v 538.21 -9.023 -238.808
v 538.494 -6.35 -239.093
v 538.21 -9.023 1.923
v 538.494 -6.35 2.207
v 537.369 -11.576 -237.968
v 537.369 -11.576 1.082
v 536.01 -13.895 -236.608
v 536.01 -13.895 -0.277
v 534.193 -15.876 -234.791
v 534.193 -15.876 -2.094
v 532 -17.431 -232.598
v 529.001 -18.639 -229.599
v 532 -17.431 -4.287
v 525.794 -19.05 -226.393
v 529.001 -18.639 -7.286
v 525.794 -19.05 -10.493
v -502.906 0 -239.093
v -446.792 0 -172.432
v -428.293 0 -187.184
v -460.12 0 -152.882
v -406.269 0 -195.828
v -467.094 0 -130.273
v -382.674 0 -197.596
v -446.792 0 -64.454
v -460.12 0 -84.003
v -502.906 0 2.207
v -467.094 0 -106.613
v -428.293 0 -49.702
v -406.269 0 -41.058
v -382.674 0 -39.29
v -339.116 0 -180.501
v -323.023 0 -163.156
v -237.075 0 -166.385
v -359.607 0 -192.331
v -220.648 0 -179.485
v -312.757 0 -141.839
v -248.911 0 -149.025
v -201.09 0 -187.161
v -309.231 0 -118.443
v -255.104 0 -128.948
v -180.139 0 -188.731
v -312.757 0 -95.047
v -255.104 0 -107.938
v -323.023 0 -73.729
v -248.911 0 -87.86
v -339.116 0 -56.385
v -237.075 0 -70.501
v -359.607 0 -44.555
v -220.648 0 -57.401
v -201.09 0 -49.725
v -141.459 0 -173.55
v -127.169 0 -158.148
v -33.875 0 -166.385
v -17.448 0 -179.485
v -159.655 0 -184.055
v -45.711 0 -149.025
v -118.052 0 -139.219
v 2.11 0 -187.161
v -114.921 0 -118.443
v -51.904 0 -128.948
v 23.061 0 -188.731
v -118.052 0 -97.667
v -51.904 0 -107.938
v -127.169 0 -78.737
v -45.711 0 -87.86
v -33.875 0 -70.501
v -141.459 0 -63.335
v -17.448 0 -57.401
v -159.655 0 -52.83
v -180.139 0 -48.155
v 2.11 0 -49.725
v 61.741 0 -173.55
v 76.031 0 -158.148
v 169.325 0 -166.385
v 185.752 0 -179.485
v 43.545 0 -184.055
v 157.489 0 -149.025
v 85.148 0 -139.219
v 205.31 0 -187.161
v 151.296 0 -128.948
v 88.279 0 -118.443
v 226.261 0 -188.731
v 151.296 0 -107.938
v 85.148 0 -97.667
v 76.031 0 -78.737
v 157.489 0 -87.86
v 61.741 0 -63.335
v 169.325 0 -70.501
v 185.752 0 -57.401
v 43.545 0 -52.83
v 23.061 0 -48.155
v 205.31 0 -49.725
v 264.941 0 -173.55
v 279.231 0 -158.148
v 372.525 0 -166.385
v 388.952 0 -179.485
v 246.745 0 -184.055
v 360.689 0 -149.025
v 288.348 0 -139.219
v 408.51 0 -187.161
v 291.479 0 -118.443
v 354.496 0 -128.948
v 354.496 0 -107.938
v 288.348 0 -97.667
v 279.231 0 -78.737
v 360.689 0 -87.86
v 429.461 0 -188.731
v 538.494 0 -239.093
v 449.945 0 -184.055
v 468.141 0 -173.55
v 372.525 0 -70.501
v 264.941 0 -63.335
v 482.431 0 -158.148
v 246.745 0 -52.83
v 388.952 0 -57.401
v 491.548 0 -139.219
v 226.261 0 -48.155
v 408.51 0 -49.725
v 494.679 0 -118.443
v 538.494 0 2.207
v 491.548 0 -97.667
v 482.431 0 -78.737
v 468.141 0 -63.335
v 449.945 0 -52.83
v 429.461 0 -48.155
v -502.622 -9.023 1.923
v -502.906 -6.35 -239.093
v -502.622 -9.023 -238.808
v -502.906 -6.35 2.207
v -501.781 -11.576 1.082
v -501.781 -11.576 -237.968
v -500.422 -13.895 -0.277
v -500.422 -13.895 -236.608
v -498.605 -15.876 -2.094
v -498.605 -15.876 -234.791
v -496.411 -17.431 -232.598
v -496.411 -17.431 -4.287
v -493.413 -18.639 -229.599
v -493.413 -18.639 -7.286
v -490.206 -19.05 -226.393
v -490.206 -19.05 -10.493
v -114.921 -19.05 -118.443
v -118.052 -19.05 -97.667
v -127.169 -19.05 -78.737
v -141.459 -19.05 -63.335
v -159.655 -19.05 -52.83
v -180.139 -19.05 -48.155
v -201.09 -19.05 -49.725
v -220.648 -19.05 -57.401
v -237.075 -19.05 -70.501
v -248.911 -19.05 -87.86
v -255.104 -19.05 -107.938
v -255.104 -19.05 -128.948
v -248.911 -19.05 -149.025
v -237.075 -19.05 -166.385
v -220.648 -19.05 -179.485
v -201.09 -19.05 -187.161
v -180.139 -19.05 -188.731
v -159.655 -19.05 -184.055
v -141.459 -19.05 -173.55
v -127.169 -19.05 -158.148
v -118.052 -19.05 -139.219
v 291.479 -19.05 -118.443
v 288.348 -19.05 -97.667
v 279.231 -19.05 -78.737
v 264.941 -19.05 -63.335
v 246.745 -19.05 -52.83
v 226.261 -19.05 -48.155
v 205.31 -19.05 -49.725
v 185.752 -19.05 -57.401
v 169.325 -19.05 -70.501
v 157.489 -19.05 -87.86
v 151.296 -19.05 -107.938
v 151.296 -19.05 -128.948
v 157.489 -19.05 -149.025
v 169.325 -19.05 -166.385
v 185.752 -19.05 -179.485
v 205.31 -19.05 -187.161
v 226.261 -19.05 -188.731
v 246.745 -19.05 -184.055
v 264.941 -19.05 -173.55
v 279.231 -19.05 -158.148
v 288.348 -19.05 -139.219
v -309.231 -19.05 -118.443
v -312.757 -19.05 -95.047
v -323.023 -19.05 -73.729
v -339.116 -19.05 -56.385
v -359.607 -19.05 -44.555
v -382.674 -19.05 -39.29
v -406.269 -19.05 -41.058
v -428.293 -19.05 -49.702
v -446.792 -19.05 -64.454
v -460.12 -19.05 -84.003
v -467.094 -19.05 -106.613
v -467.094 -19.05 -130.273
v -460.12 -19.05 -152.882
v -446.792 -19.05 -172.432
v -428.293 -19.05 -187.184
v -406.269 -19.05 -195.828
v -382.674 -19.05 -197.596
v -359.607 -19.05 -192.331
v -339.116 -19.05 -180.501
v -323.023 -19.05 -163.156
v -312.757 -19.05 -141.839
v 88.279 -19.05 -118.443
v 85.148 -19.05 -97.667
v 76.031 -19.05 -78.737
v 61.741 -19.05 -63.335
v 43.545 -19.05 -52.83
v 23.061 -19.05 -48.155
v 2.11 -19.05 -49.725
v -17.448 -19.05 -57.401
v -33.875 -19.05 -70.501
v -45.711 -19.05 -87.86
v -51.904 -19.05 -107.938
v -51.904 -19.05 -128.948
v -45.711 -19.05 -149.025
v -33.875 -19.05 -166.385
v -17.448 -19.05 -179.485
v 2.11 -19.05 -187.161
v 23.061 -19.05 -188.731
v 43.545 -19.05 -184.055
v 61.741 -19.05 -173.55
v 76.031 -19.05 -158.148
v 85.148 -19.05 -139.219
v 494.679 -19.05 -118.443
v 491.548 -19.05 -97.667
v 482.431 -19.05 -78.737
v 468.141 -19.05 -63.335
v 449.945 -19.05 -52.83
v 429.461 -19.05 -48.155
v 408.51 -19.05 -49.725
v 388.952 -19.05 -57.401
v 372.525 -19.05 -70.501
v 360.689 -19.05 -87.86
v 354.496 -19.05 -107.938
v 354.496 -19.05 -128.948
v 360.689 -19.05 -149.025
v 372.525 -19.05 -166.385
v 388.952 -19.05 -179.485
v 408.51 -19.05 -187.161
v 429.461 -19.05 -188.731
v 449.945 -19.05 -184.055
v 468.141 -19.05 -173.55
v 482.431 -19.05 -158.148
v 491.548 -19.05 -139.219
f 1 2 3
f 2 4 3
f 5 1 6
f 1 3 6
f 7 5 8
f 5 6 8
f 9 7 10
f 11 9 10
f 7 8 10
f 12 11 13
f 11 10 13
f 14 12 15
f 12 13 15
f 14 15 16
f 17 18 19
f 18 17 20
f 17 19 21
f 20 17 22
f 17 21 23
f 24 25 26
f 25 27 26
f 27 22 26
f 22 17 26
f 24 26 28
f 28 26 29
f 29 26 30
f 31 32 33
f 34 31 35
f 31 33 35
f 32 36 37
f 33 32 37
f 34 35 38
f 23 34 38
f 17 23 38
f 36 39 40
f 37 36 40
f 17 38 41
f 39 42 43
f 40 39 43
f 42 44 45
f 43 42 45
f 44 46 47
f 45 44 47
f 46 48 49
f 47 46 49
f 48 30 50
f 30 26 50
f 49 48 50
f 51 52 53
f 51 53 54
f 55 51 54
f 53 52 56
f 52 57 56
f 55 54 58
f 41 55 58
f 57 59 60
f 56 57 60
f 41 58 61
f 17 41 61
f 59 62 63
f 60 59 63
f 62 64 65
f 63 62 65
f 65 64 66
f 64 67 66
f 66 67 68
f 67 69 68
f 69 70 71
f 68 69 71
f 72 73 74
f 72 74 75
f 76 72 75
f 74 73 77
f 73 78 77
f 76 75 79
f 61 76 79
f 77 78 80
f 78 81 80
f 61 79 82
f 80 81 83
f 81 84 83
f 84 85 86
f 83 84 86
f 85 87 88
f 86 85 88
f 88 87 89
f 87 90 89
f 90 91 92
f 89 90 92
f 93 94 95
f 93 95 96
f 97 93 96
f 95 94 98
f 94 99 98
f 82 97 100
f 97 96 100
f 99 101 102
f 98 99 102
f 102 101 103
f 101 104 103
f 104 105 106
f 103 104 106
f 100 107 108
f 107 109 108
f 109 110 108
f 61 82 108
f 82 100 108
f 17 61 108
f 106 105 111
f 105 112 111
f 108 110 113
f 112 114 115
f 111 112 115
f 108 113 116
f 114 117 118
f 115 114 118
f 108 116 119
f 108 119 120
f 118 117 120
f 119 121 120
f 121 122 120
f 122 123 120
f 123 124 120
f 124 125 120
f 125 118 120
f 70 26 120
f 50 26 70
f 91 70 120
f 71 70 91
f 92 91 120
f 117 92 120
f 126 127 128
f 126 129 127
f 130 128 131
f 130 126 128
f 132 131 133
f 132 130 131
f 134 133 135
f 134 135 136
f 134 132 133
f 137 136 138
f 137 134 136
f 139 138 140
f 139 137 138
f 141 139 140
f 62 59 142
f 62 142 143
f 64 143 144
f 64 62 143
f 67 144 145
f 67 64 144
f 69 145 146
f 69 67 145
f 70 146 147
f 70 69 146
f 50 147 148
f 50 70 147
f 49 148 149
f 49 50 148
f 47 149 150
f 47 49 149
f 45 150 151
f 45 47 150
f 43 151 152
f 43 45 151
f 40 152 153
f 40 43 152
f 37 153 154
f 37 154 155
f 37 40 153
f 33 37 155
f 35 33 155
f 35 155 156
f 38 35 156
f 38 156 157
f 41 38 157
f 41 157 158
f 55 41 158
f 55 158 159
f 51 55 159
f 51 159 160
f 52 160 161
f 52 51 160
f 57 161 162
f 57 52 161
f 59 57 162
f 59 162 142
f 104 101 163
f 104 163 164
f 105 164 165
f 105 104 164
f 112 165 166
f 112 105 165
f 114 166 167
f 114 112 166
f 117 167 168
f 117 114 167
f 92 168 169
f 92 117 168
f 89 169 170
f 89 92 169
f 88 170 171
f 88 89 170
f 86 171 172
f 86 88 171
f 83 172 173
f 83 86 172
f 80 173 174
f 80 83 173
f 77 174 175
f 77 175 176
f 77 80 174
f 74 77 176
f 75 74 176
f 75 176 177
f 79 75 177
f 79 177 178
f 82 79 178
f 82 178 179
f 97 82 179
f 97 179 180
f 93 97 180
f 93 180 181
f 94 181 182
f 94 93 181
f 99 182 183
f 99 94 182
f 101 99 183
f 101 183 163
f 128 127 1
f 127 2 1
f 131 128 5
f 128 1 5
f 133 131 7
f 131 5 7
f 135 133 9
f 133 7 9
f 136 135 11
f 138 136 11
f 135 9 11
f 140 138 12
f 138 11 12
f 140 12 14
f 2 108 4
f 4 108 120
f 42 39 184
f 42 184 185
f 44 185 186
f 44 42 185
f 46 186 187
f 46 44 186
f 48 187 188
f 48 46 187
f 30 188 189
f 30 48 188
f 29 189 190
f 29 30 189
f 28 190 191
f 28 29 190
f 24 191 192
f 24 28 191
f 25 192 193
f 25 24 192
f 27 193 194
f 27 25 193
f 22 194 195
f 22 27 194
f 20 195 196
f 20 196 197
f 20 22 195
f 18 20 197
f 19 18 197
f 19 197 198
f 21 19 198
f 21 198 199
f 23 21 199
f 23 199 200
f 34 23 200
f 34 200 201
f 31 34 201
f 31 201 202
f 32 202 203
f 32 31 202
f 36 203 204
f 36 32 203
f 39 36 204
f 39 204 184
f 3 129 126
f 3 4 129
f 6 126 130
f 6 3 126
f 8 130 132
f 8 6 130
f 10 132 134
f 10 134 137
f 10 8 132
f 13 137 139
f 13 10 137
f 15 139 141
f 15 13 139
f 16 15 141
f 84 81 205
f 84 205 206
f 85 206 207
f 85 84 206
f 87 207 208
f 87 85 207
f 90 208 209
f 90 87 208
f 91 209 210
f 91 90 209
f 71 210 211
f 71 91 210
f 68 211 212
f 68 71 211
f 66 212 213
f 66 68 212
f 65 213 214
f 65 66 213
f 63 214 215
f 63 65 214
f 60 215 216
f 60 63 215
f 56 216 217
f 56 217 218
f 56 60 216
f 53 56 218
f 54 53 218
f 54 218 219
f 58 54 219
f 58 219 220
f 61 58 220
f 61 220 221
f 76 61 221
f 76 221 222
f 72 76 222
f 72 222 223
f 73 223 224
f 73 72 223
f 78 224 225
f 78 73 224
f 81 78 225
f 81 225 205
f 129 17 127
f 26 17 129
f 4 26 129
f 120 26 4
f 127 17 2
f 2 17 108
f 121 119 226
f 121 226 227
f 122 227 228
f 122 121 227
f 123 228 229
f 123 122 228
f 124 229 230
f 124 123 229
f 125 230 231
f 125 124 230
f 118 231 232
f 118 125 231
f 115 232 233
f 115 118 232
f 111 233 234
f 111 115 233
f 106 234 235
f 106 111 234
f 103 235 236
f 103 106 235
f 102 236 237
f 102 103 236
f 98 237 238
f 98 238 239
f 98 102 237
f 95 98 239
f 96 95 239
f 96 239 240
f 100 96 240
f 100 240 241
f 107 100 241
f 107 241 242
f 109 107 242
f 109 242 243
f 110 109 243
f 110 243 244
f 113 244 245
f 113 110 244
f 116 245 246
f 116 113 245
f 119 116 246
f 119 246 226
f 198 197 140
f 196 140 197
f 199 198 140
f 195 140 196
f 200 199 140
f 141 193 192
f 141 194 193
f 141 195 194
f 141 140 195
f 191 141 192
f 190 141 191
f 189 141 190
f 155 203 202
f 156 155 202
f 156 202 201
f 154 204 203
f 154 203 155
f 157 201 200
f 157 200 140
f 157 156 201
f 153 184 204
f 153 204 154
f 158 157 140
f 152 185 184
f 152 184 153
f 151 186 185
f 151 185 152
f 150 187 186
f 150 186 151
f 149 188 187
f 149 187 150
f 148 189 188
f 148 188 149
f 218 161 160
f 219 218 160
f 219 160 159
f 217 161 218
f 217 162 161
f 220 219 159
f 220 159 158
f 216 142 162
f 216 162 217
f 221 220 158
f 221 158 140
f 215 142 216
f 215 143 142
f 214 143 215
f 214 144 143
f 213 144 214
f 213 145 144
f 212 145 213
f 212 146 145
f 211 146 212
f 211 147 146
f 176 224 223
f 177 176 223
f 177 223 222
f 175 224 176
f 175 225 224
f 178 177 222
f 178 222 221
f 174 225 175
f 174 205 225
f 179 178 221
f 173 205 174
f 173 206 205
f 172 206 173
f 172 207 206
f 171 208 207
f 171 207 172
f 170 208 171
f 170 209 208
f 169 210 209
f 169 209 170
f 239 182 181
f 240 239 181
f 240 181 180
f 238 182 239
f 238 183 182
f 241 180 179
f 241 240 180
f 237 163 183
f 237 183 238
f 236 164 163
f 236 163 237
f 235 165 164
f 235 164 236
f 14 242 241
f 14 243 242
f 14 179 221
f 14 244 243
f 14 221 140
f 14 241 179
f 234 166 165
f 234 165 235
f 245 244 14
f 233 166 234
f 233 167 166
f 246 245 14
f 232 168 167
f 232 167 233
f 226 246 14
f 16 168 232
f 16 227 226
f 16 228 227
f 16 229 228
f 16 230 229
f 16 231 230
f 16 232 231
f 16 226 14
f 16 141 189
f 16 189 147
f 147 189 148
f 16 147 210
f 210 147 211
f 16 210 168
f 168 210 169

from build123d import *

# Parameters (mm, degrees)
F0_W     = 1041.4
F0_H     = 241.3
F0_R     = 79.375
F0_R_2   = 70.485
F1_DEPTH = 19.05
F2_R     = 12.7


with BuildPart() as f1:
    # F0 (on Front) → F1 (new body)
    with BuildSketch(Plane.XZ):
        with Locations((17.794014, -118.442795)):
            Rectangle(F0_W, F0_H)
        with Locations((-388.605986, -118.442795)):
            Circle(F0_R, mode=Mode.SUBTRACT)
        with Locations((-185.405986, -118.442795)):
            Circle(F0_R_2, mode=Mode.SUBTRACT)
        with Locations((17.794014, -118.442795)):
            Circle(F0_R_2, mode=Mode.SUBTRACT)
        with Locations((220.994014, -118.442795)):
            Circle(F0_R_2, mode=Mode.SUBTRACT)
        with Locations((424.194014, -118.442795)):
            Circle(F0_R_2, mode=Mode.SUBTRACT)
    extrude(amount=F1_DEPTH)

    # F2
    f2_edges = [f1.edges().sort_by_distance(p)[0] for p in [
        (17.794014, -19.05, 2.207205),
        (-502.905986, -19.05, -118.442795),
        (17.794014, -19.05, -239.092795),
        (538.494014, -19.05, -118.442795),
    ]]
    fillet(f2_edges, radius=F2_R)


solid = f1.part
